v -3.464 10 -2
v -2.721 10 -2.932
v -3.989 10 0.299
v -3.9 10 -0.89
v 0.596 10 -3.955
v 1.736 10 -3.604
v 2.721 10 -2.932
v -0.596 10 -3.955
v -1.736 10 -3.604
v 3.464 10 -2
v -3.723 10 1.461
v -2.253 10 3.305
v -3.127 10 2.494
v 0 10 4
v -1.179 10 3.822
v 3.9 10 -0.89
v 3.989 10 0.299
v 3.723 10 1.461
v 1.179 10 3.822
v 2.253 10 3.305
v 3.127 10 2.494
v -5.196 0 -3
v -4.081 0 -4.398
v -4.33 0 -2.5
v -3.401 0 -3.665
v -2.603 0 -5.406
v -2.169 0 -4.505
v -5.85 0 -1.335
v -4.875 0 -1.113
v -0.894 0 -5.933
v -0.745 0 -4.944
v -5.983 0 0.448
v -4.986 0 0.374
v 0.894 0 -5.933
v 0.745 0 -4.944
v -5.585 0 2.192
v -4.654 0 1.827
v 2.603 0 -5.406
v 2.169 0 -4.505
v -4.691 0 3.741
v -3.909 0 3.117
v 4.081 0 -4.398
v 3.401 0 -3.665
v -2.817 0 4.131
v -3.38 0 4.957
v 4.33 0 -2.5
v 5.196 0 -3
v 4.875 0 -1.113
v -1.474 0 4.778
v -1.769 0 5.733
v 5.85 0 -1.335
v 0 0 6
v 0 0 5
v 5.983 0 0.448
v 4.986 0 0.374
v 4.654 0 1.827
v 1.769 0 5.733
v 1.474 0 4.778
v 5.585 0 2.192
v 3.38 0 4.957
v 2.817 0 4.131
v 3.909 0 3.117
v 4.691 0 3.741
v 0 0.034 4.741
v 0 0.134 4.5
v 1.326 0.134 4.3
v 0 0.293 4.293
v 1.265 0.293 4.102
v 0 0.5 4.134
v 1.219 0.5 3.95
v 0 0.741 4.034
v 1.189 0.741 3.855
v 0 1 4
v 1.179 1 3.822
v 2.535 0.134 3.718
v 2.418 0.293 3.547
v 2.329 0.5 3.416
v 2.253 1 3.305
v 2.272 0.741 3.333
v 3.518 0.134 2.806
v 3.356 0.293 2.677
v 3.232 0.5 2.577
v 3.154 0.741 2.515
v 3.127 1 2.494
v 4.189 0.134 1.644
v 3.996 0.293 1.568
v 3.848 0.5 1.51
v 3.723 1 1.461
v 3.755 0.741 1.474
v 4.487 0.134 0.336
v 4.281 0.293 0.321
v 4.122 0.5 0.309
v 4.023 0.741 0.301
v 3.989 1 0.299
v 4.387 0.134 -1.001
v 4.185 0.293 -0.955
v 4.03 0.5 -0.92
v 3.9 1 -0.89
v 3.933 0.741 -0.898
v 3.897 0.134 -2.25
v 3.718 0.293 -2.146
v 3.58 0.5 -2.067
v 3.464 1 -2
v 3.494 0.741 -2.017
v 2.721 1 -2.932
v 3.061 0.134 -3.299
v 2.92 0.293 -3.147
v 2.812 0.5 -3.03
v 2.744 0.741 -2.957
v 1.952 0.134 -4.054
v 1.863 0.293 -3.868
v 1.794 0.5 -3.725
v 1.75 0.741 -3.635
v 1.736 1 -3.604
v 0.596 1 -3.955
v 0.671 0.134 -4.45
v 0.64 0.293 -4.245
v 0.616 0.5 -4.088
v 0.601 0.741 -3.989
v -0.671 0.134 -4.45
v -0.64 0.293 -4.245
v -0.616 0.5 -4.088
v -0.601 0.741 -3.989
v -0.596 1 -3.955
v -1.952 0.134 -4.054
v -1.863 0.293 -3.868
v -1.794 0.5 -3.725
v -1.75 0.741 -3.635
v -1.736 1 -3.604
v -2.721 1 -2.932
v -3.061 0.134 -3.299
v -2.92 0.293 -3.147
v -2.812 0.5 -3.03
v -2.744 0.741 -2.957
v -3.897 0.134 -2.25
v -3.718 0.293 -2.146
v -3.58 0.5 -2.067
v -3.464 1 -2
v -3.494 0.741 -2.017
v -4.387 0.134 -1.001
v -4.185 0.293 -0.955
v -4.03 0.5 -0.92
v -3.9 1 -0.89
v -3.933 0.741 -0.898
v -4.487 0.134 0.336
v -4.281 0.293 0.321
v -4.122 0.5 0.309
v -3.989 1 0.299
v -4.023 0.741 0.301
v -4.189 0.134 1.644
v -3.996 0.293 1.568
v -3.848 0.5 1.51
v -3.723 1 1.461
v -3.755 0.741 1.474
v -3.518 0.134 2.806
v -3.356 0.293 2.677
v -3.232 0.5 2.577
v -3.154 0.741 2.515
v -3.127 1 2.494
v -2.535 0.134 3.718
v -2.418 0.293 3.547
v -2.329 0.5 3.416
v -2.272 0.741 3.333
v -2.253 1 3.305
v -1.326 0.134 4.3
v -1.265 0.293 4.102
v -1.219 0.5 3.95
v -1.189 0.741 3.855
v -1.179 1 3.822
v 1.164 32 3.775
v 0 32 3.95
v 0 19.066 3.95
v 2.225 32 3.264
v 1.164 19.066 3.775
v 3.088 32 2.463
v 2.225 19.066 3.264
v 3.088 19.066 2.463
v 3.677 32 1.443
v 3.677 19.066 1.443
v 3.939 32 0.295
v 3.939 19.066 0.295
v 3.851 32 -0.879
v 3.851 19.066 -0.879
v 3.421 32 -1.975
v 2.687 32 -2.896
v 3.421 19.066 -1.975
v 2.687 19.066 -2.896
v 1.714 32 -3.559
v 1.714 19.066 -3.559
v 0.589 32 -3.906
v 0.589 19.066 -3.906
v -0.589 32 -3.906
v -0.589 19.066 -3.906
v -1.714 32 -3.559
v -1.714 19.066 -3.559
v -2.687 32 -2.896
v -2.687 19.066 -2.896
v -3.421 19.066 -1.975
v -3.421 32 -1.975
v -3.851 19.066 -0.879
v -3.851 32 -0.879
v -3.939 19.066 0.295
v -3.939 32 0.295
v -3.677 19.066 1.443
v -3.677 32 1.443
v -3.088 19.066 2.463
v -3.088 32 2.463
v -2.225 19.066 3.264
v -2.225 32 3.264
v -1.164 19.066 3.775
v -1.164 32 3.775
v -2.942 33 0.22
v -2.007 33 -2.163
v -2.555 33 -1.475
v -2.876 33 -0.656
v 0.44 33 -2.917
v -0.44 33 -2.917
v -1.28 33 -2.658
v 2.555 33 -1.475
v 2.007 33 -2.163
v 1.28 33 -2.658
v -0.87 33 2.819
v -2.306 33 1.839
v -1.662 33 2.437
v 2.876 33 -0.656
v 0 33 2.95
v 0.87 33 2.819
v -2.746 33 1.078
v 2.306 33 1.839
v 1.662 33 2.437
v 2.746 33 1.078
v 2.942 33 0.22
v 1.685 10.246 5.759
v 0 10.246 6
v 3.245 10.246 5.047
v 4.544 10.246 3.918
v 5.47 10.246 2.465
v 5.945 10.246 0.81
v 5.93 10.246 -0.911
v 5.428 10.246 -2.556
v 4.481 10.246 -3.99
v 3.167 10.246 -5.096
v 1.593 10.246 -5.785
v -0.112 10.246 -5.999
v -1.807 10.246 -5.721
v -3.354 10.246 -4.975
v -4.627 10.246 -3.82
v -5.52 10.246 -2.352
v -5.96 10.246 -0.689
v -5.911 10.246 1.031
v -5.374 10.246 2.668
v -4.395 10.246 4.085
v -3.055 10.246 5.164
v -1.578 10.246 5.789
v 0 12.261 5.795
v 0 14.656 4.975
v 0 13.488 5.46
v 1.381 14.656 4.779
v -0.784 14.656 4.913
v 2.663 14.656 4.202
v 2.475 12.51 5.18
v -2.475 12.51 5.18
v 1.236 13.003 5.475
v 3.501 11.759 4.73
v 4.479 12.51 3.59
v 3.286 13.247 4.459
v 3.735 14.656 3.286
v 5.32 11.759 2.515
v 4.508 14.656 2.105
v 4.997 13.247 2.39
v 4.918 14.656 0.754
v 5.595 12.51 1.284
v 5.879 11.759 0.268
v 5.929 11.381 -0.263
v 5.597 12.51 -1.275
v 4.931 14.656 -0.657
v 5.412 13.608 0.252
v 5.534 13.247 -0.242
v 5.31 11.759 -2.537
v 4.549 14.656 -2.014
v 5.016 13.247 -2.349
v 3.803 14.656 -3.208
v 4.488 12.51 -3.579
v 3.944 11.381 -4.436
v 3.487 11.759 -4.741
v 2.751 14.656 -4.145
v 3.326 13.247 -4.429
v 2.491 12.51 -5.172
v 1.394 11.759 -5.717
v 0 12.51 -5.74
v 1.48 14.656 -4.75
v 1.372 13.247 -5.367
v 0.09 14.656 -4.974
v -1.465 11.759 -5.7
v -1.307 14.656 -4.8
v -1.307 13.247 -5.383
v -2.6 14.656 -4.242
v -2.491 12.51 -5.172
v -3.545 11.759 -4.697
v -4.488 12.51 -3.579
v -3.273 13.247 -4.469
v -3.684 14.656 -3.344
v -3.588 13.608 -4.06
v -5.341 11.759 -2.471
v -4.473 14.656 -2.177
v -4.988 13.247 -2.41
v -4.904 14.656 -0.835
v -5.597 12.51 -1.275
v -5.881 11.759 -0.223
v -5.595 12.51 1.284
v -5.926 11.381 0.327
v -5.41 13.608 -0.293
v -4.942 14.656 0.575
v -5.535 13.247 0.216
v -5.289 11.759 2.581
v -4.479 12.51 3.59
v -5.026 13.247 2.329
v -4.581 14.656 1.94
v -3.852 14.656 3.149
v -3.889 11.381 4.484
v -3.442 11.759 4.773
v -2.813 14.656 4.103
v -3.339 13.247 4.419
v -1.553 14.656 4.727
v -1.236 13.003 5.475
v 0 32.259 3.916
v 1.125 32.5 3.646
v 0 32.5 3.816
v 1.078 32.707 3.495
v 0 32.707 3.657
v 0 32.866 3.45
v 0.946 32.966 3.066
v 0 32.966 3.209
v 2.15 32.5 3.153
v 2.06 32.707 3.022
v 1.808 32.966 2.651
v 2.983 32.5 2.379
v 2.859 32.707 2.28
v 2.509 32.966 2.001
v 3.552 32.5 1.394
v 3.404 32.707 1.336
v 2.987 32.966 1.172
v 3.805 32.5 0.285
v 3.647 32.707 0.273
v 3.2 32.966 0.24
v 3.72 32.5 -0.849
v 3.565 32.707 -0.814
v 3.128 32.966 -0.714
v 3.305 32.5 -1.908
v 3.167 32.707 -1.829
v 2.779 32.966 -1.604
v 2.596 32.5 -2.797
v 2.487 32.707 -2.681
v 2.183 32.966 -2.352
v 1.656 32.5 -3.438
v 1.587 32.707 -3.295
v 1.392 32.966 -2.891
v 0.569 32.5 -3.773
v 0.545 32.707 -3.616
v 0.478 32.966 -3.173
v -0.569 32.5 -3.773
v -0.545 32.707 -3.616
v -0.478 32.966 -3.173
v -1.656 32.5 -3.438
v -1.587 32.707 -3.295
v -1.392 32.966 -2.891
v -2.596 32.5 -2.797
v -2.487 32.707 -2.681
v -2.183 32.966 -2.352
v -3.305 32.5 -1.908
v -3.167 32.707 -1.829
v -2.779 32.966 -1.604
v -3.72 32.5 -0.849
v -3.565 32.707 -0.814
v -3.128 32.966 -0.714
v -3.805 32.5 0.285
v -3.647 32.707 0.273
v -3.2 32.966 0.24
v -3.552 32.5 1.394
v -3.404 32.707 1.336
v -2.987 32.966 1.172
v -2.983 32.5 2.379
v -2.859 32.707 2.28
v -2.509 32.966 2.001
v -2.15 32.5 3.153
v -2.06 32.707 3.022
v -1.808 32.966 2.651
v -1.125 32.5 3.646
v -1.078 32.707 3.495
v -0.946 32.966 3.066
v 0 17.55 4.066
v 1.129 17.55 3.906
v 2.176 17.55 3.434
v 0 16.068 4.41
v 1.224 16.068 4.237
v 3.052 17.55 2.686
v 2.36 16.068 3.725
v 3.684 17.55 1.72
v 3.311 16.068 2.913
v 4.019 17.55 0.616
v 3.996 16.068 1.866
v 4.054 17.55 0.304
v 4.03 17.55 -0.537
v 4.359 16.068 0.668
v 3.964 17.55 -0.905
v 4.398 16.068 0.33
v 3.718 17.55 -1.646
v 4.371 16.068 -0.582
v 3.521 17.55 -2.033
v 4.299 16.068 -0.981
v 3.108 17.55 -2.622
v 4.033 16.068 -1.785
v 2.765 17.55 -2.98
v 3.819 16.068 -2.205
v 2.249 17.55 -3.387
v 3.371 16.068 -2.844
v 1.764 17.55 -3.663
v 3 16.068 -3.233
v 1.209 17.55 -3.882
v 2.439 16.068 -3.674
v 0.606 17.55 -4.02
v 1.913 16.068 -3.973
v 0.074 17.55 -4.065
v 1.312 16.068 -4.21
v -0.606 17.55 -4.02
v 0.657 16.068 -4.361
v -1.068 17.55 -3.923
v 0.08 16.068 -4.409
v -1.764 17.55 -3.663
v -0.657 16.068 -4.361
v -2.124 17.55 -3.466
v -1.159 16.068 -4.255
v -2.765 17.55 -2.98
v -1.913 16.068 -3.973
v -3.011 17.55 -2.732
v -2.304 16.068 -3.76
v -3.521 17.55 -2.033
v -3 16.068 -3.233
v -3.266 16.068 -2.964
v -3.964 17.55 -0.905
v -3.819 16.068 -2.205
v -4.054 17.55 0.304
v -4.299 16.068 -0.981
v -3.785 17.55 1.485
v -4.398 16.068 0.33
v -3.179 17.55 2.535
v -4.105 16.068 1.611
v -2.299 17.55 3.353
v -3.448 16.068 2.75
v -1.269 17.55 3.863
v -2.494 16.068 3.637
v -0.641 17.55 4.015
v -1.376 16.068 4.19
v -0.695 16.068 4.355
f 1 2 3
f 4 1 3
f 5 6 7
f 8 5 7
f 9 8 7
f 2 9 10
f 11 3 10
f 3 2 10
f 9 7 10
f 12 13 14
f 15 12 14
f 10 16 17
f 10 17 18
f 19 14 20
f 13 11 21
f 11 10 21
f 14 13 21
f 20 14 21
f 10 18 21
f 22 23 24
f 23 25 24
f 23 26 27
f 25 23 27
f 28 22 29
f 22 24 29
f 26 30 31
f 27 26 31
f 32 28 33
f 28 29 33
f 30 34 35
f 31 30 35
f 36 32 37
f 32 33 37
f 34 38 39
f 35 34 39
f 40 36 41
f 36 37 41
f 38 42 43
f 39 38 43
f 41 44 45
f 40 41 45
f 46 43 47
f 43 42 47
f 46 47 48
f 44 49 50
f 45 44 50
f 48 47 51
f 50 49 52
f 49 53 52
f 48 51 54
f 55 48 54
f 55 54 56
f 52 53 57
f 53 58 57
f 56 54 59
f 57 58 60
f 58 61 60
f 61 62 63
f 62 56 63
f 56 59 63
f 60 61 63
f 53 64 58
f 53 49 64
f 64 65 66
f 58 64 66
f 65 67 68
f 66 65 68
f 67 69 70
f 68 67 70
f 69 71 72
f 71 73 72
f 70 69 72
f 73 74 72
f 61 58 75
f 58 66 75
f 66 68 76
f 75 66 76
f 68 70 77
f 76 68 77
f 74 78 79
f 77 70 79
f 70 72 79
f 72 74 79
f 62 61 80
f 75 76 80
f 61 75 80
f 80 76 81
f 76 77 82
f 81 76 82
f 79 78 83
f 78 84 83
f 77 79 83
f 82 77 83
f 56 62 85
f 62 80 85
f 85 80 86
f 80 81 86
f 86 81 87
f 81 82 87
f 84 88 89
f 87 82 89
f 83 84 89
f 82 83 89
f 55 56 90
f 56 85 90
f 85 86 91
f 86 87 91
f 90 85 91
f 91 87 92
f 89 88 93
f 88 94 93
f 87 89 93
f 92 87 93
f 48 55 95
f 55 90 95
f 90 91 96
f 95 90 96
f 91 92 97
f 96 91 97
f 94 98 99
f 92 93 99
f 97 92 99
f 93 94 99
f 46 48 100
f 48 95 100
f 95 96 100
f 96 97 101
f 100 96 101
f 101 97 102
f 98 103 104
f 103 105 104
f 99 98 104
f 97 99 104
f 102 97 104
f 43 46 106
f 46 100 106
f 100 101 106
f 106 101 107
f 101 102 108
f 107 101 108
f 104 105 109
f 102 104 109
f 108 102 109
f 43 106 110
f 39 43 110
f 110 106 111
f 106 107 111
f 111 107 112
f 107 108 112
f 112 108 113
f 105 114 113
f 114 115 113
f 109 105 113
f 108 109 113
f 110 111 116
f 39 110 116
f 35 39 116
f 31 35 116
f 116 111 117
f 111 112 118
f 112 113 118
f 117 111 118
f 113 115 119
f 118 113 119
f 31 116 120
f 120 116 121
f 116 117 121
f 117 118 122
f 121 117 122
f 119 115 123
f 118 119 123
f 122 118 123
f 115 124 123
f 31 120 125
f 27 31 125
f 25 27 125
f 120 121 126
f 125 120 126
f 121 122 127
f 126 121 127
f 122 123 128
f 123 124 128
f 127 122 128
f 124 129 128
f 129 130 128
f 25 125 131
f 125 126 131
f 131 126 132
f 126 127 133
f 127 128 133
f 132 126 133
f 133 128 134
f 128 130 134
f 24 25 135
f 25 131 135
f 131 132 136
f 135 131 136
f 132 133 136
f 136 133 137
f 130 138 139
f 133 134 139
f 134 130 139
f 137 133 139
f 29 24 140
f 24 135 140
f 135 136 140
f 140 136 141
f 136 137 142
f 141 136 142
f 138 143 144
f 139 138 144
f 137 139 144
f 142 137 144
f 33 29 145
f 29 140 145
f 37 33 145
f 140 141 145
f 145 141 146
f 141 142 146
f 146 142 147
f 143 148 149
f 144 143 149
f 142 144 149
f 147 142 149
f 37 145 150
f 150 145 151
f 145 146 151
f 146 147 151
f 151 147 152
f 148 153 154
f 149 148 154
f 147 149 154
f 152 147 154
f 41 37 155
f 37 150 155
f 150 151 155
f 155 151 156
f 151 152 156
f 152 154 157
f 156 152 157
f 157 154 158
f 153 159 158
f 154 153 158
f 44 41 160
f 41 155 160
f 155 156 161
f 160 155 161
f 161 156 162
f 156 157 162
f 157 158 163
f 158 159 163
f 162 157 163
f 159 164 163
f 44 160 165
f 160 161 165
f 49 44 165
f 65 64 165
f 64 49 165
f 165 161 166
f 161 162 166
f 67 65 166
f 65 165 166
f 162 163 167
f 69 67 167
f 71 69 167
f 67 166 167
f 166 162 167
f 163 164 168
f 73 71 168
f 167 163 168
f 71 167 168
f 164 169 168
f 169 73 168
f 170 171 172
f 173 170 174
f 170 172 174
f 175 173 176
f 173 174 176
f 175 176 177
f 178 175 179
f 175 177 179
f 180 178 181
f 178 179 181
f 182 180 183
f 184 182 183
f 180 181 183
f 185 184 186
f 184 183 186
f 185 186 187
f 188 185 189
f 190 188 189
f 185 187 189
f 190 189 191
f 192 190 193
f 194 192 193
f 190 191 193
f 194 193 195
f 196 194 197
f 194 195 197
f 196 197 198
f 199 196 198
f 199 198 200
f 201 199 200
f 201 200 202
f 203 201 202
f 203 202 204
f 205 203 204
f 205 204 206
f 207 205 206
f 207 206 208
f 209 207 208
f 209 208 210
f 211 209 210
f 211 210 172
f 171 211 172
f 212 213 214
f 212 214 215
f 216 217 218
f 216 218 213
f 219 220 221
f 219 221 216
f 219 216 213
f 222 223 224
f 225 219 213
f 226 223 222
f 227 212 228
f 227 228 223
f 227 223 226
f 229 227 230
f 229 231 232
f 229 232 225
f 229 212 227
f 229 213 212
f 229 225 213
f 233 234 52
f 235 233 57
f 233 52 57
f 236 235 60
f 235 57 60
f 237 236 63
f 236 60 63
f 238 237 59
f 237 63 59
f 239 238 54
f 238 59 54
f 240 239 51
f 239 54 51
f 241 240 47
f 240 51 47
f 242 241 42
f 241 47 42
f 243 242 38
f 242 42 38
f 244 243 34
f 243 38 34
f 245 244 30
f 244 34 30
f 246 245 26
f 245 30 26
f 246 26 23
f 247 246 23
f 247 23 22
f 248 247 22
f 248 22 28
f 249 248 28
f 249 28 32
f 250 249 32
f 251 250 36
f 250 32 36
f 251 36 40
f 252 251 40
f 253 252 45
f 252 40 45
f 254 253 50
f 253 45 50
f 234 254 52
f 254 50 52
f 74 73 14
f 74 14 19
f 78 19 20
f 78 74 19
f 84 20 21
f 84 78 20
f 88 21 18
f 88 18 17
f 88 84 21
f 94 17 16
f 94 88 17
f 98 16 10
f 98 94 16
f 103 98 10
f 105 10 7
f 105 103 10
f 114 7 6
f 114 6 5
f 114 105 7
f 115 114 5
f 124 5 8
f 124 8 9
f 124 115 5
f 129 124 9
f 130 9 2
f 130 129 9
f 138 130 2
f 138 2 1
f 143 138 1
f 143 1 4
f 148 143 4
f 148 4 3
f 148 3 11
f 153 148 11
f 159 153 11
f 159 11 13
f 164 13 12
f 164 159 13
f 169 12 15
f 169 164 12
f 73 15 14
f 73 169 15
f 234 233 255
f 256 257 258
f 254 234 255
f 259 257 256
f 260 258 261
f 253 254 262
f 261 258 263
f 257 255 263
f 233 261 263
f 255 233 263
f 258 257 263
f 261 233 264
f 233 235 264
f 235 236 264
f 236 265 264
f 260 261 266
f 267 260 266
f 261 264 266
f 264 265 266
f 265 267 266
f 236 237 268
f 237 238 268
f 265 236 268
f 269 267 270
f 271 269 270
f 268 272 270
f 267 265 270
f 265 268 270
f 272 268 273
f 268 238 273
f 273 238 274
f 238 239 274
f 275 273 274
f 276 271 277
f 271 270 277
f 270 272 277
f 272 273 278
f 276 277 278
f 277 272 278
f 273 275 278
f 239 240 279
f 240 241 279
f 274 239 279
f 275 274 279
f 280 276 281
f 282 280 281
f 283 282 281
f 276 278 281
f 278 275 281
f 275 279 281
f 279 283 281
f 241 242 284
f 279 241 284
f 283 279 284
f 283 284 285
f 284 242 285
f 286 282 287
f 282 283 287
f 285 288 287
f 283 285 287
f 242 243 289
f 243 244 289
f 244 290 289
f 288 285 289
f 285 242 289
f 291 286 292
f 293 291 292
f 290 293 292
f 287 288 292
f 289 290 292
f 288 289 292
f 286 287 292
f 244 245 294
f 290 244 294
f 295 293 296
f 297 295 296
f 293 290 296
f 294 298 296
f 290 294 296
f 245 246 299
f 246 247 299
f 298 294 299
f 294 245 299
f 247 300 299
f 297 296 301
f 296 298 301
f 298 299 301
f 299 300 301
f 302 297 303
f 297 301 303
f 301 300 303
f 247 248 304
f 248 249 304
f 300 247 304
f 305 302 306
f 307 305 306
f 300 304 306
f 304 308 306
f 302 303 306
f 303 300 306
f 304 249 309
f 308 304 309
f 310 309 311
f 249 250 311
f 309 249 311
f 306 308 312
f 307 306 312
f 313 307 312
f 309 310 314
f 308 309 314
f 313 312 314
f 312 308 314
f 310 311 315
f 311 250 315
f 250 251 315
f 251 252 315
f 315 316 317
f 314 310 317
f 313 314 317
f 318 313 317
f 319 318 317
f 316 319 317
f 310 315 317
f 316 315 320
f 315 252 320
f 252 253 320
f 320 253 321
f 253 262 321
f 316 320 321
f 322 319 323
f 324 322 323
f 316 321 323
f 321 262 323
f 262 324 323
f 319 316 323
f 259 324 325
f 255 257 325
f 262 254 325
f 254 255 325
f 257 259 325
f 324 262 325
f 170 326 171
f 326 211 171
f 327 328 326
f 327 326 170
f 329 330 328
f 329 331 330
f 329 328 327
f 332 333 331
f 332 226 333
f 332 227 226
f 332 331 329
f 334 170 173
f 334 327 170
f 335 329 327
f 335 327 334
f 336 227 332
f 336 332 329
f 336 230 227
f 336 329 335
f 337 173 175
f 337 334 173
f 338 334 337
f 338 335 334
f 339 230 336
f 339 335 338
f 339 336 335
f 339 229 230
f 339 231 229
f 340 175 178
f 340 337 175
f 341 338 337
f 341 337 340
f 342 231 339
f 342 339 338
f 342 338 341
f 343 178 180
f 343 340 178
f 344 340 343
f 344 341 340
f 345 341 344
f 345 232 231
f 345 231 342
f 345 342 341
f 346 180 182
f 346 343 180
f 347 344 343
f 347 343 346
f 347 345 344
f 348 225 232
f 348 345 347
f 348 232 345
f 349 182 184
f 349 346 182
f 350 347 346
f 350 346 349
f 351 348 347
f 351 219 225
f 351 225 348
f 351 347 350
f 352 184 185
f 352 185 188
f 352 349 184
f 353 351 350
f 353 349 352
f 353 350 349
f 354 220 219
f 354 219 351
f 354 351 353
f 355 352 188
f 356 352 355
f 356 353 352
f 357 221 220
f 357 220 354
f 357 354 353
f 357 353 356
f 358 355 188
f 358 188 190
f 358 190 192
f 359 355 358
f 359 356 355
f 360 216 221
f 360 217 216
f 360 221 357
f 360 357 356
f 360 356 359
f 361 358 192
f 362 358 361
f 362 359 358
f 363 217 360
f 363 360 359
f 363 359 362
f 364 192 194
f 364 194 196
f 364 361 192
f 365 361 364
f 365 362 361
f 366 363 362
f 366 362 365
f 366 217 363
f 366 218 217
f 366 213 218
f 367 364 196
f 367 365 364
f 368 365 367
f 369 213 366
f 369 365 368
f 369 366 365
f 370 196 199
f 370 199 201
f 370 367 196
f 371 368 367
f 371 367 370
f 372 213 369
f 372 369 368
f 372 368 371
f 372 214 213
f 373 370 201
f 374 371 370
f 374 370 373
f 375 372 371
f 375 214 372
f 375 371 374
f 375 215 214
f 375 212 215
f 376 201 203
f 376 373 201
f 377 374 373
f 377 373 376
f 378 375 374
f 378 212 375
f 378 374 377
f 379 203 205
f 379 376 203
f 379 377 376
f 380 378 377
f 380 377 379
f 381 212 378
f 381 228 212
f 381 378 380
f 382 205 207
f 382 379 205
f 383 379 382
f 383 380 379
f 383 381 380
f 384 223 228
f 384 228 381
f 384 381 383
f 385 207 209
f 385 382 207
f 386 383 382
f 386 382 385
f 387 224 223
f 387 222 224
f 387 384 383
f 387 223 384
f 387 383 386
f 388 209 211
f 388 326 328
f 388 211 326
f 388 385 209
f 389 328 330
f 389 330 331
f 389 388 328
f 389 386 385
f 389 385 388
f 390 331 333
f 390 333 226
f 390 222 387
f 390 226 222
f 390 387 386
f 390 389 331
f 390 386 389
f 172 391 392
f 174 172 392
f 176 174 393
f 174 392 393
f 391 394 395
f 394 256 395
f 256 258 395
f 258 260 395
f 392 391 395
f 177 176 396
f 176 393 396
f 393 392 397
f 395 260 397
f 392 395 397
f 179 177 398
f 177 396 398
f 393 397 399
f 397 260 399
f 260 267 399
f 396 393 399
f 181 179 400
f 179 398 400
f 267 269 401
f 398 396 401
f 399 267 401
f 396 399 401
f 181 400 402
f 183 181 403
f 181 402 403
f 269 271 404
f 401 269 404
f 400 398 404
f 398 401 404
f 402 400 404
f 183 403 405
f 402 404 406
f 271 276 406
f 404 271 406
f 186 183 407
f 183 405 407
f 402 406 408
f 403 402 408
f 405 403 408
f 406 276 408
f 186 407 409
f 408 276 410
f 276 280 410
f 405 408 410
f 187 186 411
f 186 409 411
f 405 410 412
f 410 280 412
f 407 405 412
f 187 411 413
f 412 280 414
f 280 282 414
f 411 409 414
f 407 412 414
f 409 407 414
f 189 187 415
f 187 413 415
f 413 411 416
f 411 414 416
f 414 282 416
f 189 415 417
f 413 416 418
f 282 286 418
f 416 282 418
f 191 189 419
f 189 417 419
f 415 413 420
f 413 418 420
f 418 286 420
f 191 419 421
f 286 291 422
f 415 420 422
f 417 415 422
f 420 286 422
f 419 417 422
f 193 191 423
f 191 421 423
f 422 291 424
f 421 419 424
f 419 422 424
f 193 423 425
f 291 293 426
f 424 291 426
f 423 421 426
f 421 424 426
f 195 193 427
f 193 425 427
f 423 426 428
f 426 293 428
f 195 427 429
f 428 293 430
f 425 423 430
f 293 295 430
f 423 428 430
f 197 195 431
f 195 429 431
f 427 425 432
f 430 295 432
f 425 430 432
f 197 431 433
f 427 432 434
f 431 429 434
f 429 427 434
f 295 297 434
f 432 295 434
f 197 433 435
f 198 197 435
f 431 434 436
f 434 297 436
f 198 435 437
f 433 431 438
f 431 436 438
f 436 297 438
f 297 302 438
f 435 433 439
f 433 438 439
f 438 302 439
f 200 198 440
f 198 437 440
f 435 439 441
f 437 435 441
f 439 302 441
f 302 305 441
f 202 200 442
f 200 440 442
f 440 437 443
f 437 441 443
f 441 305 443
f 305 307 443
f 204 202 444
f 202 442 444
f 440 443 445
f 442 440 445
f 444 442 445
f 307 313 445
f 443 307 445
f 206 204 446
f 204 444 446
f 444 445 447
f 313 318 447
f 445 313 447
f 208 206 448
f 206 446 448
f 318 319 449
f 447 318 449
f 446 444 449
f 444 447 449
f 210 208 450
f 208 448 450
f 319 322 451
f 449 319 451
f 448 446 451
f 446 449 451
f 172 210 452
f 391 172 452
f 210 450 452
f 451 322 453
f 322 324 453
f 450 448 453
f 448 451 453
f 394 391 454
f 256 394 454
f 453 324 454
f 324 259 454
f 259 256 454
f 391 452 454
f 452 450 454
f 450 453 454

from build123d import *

# Parameters (mm, degrees)
SKETCH1_R           = 6
SKETCH1_R_2         = 4
BOSS_EXTRUDE1_DEPTH = 10
SKETCH2_R           = 6
BOSS_EXTRUDE2_DEPTH = 3
SKETCH3_R           = 3.95
BOSS_EXTRUDE3_DEPTH = 20
FILLET1_R           = 1
FILLET2_R           = 10
FILLET3_R           = 1
FILLET4_R           = 10


with BuildPart() as part:
    # Sketch1 → Boss-Extrude1 (new body)
    with BuildSketch(Plane(origin=(0, 0, 0), x_dir=(1, 0, 0), z_dir=(0, 1, 0))):
        with Locations(Location((0, 0, 0), (0, 0, 270))):
            Circle(SKETCH1_R)
        with Locations(Location((0, 0, 0), (0, 0, 270))):
            Circle(SKETCH1_R_2, mode=Mode.SUBTRACT)
    extrude(amount=BOSS_EXTRUDE1_DEPTH)

    # Sketch2 → Boss-Extrude2 (add)
    with BuildSketch(Plane(origin=(0, 10, 0), x_dir=(1, 0, 0), z_dir=(0, 1, 0))):
        with Locations(Location((0, 0, 0), (0, 0, 270))):
            Circle(SKETCH2_R)
    extrude(amount=BOSS_EXTRUDE2_DEPTH)

    # Sketch3 → Boss-Extrude3 (add)
    with BuildSketch(Plane(origin=(0, 13, 0), x_dir=(1, 0, 0), z_dir=(0, 1, 0))):
        with Locations(Location((0, 0, 0), (0, 0, 270))):
            Circle(SKETCH3_R)
    extrude(amount=BOSS_EXTRUDE3_DEPTH)

    # Fillet1
    fillet1_edges = [part.edges().sort_by_distance(p)[0] for p in [
        (0, 33, -3.95),
    ]]
    fillet(fillet1_edges, radius=FILLET1_R)

    # Fillet2
    # the kernel refuses this fillet: 10 mm, written as the material it adds along each edge
    with BuildSketch(Plane(origin=(0, 13, 0), x_dir=(0, 0, 1), z_dir=(-1, 0, 0))) as fillet2_piece_1:
        with BuildLine():
            CenterArc((13.95, 6.066094295), FILLET2_R, 180, 37.344744354)
            Line((6, 0), (5.841, -0.121321886))
            ThreePointArc((5.841, -0.121321886), (4.975, -0.2), (3.95, -0.2))
            Line((3.95, -0.2), (3.75, 0))
            Line((3.75, 0), (3.75, 6.066094295))
            Line((3.75, 6.066094295), (3.95, 6.066094295))
        make_face()
    revolve(axis=Axis((0, 13, 0), (0, 1, 0)))

    # Fillet3
    fillet3_edges = [part.edges().sort_by_distance(p)[0] for p in [
        (0, 0, -4),
    ]]
    fillet(fillet3_edges, radius=FILLET3_R)

    # Fillet4
    fillet4_edges = [part.edges().sort_by_distance(p)[0] for p in [
        (0, 13, -6),
    ]]
    fillet(fillet4_edges, radius=FILLET4_R)


solid = part.part
